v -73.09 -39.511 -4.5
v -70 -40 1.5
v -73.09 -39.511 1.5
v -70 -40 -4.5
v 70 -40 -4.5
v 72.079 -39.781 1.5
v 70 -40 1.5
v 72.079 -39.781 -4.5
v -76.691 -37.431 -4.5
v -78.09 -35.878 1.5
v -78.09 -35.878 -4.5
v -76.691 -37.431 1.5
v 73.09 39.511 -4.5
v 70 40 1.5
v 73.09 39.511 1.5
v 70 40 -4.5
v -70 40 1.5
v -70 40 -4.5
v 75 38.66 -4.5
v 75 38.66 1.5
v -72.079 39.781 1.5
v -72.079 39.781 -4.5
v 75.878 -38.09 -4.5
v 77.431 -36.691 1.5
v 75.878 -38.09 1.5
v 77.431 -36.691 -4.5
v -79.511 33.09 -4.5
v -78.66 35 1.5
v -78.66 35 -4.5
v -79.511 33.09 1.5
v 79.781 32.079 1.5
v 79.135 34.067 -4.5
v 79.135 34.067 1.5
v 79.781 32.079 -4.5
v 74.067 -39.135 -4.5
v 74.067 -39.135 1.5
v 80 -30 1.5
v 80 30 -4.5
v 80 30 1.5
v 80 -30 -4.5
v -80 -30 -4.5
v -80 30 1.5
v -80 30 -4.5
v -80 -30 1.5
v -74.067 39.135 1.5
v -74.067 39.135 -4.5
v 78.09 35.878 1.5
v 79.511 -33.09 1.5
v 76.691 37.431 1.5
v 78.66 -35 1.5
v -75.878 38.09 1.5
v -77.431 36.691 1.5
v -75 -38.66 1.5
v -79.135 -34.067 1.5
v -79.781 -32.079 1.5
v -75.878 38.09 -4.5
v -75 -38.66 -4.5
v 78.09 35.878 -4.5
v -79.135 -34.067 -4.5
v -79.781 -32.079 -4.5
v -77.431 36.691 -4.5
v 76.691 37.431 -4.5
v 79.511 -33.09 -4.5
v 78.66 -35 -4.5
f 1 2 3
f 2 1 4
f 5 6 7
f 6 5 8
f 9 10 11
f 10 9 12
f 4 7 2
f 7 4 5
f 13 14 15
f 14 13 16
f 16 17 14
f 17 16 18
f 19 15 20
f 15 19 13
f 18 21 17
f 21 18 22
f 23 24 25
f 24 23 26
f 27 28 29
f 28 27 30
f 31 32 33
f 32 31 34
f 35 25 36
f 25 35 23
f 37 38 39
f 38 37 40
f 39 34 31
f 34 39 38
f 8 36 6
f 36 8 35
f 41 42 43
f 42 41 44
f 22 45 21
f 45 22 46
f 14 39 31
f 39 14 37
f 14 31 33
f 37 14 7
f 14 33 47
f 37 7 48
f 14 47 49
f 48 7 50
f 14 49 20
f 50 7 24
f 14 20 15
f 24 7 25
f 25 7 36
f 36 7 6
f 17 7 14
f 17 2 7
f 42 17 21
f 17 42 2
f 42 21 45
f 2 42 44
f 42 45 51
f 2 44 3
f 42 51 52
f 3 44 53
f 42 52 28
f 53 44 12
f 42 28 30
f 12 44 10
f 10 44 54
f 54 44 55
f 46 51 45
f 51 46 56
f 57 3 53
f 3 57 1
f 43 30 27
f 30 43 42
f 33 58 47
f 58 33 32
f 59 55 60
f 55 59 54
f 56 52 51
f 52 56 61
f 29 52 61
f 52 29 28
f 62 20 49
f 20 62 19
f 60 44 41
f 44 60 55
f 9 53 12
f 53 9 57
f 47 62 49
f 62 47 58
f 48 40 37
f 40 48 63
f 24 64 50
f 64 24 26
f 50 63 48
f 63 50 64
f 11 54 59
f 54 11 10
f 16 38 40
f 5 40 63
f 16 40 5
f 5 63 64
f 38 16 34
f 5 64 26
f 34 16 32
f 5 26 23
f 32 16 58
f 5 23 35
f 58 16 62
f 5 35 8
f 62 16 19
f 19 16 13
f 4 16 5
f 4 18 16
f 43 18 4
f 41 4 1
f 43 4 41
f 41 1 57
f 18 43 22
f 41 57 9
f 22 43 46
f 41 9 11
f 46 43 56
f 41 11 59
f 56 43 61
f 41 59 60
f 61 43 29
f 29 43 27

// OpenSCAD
/*
 * Chiffres pechants
 */
echo(version=version());

// Base plate
// ----------
plateWidth = 160;    // 50
plateLength = 80;   // 50
plateThickNess = 3;
cornerRadius = 10;

logo = "./images/seventeen.png"; // White on Black !!
imgRatio = 0.4;
logox = 450 * imgRatio; 
logoy = 450 * imgRatio; 

module roundedRect(size, radius) {  
	linear_extrude(height=size.z, center=true) {
		offset(radius) offset(-radius) {
			square([size.x, size.y], center = true);
		}
	}
}

difference() {  
	union() {
		difference() {
			roundedRect([plateWidth, plateLength, plateThickNess], cornerRadius);
			translate([20, 0, 5]) {
				scale([.9 * plateWidth / logox, .9 * plateWidth / logoy, .2]) {
					color("silver") {
						rotate([0, 0, 0]) {
              surface(file=logo, invert=true, center=true); // , convexity=5);
						}
					}
				}
			}
		}
    translate([0, 0, -3]) {
      roundedRect([plateWidth, plateLength, plateThickNess], cornerRadius);
    }
	}
}
